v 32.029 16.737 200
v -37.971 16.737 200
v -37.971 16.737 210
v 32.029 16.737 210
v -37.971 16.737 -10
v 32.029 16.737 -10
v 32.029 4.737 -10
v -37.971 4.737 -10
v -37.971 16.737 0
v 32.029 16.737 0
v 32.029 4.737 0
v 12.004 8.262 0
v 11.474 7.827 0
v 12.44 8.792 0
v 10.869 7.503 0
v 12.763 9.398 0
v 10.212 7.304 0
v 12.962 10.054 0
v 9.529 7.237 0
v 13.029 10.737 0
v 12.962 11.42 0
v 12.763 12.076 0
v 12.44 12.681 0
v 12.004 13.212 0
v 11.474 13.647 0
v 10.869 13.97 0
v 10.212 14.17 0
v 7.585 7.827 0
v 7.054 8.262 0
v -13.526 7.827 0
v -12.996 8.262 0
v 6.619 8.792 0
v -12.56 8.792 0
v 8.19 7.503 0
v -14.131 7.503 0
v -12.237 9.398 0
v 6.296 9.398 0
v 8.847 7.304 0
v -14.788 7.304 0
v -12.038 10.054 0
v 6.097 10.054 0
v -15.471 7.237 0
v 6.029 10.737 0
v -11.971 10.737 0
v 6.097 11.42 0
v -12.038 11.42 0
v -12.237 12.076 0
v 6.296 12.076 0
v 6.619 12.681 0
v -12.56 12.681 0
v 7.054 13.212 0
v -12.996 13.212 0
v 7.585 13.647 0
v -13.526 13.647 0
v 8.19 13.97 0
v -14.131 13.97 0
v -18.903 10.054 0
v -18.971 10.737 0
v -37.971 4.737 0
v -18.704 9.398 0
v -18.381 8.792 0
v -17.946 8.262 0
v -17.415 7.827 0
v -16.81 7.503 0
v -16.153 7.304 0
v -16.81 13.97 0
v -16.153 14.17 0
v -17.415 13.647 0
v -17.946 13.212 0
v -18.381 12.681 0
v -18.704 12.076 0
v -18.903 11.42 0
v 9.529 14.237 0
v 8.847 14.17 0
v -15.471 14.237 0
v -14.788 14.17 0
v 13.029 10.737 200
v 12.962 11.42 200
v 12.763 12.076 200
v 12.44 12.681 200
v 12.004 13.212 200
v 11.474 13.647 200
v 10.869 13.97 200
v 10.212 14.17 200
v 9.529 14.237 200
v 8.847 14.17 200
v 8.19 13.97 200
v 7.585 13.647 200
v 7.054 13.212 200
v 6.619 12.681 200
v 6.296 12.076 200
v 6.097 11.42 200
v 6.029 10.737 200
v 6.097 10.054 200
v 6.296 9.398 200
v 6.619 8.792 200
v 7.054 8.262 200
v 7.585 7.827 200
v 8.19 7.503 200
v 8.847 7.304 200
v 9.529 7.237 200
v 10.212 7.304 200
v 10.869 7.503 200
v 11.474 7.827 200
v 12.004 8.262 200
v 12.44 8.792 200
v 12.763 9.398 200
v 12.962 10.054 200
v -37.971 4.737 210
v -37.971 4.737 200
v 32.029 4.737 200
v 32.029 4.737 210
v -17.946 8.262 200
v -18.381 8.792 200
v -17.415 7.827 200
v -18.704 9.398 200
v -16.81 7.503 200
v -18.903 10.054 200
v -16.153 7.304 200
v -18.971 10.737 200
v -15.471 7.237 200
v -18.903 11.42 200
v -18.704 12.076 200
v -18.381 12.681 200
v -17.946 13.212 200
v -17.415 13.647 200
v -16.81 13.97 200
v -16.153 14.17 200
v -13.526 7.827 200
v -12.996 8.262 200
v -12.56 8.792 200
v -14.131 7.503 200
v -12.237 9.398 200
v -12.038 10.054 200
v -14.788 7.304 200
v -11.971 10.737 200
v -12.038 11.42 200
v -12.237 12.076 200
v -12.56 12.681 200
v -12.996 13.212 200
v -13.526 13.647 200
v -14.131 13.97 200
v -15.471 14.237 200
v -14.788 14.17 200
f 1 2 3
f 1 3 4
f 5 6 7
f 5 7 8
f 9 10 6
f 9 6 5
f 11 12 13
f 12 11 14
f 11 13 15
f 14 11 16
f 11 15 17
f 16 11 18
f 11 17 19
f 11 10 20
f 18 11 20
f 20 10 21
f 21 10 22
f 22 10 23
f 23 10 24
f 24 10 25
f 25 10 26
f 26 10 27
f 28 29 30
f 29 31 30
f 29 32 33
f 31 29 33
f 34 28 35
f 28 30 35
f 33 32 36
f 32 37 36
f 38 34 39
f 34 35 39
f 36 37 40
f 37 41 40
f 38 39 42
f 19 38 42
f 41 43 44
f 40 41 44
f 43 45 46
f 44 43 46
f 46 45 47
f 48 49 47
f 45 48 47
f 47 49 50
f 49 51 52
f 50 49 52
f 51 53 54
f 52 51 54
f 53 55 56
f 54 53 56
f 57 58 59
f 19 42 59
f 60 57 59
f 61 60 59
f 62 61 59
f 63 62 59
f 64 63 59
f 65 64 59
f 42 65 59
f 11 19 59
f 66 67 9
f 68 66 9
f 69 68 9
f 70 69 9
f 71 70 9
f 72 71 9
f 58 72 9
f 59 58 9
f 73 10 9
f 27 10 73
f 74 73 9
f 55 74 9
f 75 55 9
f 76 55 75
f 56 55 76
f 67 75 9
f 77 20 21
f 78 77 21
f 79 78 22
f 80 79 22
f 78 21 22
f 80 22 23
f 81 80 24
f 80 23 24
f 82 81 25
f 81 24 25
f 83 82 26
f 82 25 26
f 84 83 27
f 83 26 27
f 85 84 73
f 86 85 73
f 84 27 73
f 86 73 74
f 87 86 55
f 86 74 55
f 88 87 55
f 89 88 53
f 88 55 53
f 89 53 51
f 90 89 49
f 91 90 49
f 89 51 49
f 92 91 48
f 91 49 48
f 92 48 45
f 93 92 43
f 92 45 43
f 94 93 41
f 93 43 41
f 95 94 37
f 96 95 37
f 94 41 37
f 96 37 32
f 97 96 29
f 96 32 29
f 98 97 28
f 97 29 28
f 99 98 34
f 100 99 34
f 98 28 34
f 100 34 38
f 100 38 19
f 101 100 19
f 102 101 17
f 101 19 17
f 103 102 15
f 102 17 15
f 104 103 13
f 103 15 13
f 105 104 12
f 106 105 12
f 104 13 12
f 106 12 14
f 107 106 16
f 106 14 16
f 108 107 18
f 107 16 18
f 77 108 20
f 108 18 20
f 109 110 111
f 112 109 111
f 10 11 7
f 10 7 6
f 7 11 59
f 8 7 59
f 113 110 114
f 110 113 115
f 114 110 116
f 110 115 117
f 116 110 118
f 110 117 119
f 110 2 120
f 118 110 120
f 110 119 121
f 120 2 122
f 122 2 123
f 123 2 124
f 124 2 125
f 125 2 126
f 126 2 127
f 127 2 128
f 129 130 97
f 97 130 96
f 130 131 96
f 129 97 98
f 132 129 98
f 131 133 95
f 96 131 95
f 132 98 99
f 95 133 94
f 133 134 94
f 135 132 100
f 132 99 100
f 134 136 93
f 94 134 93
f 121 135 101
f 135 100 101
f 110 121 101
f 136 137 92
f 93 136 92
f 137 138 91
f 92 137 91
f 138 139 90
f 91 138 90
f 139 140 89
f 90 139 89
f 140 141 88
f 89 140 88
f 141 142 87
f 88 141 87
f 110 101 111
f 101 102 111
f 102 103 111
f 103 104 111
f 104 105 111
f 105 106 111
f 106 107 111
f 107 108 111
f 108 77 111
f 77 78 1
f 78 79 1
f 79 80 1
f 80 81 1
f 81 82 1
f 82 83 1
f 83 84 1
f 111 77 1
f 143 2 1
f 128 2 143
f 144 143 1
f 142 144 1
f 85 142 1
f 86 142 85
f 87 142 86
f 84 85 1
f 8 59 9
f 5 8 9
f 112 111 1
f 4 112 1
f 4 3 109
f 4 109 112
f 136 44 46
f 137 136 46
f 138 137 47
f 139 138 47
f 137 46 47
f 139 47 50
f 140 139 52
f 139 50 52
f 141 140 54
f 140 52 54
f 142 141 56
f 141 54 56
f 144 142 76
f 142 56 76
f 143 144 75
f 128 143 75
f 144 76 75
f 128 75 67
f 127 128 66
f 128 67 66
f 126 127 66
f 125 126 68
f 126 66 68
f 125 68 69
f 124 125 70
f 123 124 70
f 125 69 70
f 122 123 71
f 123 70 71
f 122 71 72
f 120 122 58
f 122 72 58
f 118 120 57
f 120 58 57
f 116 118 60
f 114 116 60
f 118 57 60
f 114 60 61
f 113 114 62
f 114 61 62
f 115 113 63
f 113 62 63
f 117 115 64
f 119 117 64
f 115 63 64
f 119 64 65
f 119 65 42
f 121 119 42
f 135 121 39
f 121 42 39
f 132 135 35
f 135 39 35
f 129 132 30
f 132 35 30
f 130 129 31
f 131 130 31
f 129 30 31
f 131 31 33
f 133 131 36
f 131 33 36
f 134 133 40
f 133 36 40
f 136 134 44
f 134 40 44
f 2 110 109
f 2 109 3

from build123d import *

# Parameters (mm, degrees)
ESQUISSE1_R          = 3.5
BOSS_EXTRU_1_DEPTH   = 200
BOSS_EXTRU_1_2_DEPTH = 200
ESQUISSE2_W          = 70
ESQUISSE2_H          = 12
BOSS_EXTRU_2_DEPTH   = 10
ESQUISSE3_W          = 70
ESQUISSE3_H          = 12
BOSS_EXTRU_3_DEPTH   = 10


with BuildPart() as part:
    # Esquisse1 → Boss.-Extru.1 (new body)
    with BuildSketch(Plane.XY):
        with Locations((-15.470635051, 10.736898533)):
            Circle(ESQUISSE1_R)
    extrude(amount=BOSS_EXTRU_1_DEPTH)



with BuildPart() as body_2:
    # Esquisse1 → Boss.-Extru.1 2 (new body)
    with BuildSketch(Plane.XY):
        with Locations((9.529364949, 10.736898533)):
            Circle(ESQUISSE1_R)
    extrude(amount=BOSS_EXTRU_1_2_DEPTH)


with BuildPart() as part_1:
    add(part.part)

    add(body_2.part)  # Boss.-Extru.2 merges body 2
    # Esquisse2 → Boss.-Extru.2 (add)
    with BuildSketch(Plane(origin=(0, 0, 0), x_dir=(-1, 0, 0), z_dir=(0, 0, -1))):
        with Locations((2.970635051, 10.736898533)):
            Rectangle(ESQUISSE2_W, ESQUISSE2_H)
    extrude(amount=BOSS_EXTRU_2_DEPTH)

    # Esquisse3 → Boss.-Extru.3 (add)
    with BuildSketch(Plane.XY.offset(200)):
        with Locations((-2.970635051, 10.736898533)):
            Rectangle(ESQUISSE3_W, ESQUISSE3_H)
    extrude(amount=BOSS_EXTRU_3_DEPTH)


solid = part_1.part
